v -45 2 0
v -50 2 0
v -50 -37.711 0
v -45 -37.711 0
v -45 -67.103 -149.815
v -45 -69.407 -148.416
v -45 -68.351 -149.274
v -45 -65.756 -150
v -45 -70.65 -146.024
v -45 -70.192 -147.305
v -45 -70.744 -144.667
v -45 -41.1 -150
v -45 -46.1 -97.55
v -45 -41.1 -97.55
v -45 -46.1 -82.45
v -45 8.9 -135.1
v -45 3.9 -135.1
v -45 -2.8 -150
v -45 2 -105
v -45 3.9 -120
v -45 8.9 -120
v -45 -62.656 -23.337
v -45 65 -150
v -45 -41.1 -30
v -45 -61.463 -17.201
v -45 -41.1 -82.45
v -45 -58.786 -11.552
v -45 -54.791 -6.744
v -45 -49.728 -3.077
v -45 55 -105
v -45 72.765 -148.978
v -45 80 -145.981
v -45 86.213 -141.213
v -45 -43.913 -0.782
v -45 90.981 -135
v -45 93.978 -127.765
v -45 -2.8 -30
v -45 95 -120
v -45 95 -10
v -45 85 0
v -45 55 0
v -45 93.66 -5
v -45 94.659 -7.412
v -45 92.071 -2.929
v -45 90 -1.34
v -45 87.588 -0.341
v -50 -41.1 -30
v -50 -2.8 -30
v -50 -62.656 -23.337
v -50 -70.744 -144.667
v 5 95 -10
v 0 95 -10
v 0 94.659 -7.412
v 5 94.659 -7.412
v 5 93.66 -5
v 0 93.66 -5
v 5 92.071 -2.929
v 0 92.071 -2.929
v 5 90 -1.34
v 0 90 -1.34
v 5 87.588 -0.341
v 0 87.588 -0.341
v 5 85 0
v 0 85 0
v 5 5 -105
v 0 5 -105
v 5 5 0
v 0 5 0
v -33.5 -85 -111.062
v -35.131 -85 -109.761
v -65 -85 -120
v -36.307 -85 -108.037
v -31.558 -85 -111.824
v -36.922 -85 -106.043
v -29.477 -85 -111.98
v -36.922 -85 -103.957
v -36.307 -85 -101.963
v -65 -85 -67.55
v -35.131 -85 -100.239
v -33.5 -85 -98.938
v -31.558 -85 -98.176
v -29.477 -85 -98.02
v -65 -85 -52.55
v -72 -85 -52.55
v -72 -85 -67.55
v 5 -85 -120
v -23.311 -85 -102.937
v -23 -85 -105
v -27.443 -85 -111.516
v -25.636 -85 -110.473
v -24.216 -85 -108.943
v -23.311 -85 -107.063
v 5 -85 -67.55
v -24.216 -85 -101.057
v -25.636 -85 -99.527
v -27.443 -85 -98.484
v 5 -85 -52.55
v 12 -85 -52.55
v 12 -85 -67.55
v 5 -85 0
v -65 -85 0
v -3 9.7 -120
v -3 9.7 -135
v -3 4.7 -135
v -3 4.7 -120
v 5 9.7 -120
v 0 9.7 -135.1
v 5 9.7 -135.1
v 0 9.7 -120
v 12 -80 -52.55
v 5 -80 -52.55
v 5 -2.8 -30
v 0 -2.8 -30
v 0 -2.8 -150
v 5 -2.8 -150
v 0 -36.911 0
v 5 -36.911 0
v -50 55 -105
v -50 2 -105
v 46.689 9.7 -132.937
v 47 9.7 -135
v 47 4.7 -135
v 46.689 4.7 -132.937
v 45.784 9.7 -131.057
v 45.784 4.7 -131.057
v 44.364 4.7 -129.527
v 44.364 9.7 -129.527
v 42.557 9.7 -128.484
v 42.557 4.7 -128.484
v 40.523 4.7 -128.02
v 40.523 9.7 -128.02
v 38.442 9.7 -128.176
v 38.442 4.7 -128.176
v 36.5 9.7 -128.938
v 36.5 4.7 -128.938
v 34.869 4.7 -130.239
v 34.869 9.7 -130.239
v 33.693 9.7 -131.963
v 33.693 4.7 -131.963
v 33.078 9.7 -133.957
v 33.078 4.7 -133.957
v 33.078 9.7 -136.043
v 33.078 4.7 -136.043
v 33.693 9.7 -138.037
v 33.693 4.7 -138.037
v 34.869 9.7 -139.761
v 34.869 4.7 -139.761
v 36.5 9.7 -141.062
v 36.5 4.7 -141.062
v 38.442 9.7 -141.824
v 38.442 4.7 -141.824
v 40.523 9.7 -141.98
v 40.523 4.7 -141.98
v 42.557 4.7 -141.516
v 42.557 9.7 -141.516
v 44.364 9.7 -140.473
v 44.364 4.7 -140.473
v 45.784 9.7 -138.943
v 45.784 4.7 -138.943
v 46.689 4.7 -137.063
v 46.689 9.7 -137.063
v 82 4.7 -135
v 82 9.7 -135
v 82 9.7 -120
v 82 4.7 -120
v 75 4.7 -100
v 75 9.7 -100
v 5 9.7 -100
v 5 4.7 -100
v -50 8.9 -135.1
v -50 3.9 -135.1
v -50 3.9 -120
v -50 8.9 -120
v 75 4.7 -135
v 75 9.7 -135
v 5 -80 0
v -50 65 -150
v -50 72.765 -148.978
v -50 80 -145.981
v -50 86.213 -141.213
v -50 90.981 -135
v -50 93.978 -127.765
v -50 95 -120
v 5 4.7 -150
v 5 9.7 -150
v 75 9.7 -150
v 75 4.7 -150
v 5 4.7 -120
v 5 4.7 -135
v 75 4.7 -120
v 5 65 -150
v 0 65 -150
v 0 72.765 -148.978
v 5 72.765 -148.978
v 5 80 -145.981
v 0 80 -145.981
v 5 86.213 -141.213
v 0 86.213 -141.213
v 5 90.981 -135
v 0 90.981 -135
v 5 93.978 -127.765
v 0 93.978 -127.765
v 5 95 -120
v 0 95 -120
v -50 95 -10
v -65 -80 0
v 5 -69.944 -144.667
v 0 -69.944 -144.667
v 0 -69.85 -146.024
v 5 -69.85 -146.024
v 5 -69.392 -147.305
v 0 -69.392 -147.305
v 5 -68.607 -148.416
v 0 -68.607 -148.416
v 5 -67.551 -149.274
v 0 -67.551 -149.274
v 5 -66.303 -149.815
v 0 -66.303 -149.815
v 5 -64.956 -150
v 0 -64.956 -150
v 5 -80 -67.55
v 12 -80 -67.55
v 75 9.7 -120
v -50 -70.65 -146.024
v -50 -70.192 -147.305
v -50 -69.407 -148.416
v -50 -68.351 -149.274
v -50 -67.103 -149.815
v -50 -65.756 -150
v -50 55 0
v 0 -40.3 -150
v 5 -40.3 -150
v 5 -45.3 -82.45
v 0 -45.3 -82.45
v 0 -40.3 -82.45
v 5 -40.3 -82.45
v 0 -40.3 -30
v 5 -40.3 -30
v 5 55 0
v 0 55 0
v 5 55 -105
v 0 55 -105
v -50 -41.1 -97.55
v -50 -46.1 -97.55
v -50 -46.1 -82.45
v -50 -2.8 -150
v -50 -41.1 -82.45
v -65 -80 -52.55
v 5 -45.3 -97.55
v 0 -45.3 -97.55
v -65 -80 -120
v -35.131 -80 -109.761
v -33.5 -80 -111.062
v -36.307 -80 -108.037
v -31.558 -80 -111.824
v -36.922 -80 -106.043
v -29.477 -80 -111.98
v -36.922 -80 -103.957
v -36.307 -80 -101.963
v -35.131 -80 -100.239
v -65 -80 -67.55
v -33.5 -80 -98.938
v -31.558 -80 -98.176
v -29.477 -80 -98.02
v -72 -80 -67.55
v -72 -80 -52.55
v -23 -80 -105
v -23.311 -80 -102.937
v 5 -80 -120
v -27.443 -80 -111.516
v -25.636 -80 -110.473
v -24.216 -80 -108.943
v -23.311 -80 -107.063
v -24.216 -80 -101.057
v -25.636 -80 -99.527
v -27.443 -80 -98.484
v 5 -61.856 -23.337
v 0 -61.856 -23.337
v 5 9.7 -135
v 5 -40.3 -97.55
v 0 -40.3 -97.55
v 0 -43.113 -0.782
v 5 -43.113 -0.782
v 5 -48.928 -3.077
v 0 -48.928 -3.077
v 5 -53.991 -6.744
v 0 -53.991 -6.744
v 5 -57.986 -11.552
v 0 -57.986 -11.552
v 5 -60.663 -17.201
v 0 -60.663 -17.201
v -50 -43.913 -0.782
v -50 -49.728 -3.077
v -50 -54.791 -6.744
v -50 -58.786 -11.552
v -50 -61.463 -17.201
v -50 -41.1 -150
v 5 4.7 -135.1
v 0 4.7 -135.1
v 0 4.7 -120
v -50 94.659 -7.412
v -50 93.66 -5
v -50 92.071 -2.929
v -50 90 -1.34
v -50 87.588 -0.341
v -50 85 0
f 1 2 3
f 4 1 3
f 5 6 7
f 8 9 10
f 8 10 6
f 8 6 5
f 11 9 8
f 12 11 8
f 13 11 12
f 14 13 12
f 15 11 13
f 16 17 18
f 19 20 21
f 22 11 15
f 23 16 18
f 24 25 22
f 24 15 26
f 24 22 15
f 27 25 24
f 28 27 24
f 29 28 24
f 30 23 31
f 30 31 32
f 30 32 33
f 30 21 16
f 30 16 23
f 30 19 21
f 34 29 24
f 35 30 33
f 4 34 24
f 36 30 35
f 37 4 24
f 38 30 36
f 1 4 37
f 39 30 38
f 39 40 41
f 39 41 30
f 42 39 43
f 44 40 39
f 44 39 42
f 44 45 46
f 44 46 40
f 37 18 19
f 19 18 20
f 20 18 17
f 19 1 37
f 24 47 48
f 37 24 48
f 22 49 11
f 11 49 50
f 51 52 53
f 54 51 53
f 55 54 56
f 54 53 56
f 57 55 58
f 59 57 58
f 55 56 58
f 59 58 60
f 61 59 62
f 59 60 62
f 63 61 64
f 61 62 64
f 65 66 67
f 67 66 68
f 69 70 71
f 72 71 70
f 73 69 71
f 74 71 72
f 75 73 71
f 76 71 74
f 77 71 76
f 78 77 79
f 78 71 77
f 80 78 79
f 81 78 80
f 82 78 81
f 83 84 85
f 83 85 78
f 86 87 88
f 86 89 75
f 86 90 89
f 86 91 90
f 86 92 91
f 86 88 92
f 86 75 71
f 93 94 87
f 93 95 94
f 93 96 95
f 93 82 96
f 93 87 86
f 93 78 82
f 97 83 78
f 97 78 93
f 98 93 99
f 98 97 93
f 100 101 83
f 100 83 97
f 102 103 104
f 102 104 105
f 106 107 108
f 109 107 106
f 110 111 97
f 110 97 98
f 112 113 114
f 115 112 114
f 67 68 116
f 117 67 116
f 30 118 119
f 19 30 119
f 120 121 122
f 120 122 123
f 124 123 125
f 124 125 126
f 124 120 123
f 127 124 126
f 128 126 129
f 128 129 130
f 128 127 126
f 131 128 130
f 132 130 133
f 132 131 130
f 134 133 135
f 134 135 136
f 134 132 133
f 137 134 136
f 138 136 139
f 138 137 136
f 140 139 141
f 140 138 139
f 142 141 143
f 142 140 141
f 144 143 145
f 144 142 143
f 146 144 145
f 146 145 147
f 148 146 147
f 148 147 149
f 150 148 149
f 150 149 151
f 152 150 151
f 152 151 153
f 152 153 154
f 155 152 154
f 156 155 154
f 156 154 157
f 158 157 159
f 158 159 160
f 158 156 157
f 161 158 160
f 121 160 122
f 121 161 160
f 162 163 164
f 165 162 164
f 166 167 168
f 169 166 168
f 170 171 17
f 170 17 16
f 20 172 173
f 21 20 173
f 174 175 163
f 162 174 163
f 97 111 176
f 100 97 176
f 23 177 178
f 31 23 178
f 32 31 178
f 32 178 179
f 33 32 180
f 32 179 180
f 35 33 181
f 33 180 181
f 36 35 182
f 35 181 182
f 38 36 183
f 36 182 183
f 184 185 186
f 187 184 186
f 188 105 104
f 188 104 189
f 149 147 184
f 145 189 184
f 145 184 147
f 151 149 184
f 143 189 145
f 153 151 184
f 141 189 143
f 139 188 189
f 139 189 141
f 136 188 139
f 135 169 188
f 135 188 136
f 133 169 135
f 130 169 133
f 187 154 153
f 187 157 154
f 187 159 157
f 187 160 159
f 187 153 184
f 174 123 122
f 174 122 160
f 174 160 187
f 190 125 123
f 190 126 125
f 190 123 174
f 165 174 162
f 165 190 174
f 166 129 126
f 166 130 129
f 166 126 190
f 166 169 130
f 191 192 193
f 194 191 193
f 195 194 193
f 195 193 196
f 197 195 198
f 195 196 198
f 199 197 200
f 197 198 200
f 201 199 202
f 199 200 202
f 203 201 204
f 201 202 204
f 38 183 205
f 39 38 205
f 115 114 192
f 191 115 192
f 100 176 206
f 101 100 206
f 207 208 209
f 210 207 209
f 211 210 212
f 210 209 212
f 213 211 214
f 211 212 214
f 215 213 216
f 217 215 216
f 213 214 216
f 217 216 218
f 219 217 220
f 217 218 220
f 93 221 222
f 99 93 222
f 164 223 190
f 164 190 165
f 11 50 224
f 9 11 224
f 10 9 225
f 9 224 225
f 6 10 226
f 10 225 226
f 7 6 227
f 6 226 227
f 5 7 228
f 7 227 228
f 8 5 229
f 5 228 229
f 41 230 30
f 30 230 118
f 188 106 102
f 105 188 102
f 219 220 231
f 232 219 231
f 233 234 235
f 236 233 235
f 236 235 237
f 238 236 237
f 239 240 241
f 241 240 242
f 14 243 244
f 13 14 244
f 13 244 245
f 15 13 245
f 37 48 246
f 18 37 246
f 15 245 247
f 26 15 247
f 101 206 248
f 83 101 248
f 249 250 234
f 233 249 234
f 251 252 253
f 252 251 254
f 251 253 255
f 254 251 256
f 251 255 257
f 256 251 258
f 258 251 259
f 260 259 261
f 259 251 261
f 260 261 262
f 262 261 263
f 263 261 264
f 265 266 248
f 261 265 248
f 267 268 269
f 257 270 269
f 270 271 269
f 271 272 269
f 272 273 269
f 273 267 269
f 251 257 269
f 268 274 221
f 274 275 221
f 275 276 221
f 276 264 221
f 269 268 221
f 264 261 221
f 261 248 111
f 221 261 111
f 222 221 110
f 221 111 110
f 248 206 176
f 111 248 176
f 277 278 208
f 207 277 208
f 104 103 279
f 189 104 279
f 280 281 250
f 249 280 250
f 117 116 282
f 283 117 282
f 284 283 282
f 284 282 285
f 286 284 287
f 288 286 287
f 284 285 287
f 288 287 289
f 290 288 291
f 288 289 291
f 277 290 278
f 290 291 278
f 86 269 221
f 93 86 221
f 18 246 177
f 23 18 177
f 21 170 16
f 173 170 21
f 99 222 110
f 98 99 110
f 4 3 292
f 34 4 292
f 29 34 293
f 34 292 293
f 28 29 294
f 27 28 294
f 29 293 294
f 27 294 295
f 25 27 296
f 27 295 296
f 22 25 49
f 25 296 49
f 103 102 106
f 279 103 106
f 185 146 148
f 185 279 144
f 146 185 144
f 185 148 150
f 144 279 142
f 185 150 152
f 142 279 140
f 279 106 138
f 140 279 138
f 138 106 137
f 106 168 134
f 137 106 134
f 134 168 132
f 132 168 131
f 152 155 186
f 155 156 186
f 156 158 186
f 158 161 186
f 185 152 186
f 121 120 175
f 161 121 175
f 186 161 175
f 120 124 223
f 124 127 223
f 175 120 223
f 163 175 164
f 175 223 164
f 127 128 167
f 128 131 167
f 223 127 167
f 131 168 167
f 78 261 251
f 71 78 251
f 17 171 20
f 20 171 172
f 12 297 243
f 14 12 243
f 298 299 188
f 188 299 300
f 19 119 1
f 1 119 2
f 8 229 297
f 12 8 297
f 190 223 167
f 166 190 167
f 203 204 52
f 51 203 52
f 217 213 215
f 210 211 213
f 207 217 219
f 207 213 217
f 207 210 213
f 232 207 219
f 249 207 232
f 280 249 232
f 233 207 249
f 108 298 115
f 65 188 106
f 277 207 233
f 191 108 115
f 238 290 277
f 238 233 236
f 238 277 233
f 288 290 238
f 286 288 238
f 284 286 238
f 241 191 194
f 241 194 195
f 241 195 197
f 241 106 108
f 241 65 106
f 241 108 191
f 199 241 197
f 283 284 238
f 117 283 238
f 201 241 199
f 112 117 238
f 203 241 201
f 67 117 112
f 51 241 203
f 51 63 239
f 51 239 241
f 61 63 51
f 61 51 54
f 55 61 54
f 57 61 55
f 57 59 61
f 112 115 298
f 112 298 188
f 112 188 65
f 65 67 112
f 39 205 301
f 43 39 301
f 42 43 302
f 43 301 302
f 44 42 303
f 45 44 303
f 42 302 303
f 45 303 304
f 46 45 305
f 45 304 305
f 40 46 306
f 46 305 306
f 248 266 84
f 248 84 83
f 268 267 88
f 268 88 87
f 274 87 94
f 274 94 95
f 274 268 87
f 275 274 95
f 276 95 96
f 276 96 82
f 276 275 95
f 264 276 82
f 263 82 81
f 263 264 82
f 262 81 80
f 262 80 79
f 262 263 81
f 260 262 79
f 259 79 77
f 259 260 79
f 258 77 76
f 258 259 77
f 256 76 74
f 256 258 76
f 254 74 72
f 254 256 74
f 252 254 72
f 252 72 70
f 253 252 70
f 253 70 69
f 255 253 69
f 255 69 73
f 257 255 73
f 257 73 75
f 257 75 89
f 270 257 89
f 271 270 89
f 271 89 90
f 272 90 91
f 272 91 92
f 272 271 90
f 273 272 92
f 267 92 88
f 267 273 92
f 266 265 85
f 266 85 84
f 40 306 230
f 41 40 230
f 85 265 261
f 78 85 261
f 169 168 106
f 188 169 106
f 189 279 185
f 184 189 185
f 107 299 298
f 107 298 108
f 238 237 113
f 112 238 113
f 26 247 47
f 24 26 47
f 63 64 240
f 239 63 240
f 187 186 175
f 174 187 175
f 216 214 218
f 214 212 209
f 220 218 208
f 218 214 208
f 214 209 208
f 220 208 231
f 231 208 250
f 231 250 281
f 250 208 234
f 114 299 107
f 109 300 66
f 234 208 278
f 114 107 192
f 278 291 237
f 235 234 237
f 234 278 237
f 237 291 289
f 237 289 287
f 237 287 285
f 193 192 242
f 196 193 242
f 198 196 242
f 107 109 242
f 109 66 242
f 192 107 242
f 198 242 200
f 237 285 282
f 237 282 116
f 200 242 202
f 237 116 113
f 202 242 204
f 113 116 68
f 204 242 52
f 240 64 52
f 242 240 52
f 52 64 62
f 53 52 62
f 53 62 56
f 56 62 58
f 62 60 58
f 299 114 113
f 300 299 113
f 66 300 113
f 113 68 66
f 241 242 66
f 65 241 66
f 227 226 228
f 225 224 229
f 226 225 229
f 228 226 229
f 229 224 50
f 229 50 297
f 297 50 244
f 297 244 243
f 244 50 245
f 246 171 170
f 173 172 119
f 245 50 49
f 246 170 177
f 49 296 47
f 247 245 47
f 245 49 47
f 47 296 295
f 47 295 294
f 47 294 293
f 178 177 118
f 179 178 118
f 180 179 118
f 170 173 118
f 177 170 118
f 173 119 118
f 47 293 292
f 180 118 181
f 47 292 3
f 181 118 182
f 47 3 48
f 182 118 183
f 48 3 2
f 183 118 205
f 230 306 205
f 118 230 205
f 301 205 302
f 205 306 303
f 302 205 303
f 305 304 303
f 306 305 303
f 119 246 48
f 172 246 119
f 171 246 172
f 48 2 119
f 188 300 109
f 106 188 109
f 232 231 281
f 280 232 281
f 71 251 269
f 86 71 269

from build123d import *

# Parameters (mm, degrees)
F0_W     = 5
F0_H     = 15.1
F0_W_2   = 0.3
F1_DEPTH = 5
F2_W     = 7
F2_H     = 15
F2_R     = 7
F2_W_2   = 3
F2_W_3   = 5
F3_DEPTH = 5
F5_W     = 5
F5_H     = 15.1
F6_DEPTH = 5
F8_W     = 7
F8_H     = 15
F8_W_2   = 70
F8_H_2   = 50
F8_R     = 7
F9_DEPTH = 5


with BuildPart() as f1:
    # F0 (on Right) → F1 (new body)
    with BuildSketch(Plane.YZ):
        with BuildLine():
            Line((5, -82.45), (5, 0))
            Line((5, 0), (0, 0))
            Line((0, 0), (-36.911173, 0))
            ThreePointArc((-36.911173, 0), (-53.990775, -6.743845), (-61.855802, -23.337025))
            Line((-61.855802, -23.337025), (-69.944494, -144.667405))
            ThreePointArc((-69.944494, -144.667405), (-68.606799, -148.41592), (-64.955568, -150))
            Line((-64.955568, -150), (-40.3, -150))
            Line((-40.3, -150), (-40.3, -97.55))
            Line((-40.3, -97.55), (-45.3, -97.55))
            Line((-45.3, -97.55), (-45.3, -82.45))
            Line((-45.3, -82.45), (-40.3, -82.45))
            Line((-40.3, -82.45), (-40.3, -30))
            Line((-40.3, -30), (-2.8, -30))
            Line((-2.8, -30), (-2.8, -150))
            Line((-2.8, -150), (4.7, -150))
            Line((4.7, -150), (65, -150))
            ThreePointArc((65, -150), (86.213203, -141.213203), (95, -120))
            Line((95, -120), (95, -10))
            ThreePointArc((95, -10), (92.071068, -2.928932), (85, 0))
            Line((85, 0), (55, 0))
            Line((55, 0), (55, -105))
            Line((55, -105), (5, -105))
            Line((5, -105), (5, -97.55))
            Line((5, -97.55), (4.7, -97.55))
            Line((4.7, -97.55), (4.7, -82.45))
            Line((4.7, -82.45), (5, -82.45))
        make_face()
        with Locations((7.2, -127.55)):
            Rectangle(F0_W, F0_H, mode=Mode.SUBTRACT)
        with Locations((4.85, -90)):
            Rectangle(F0_W_2, F0_H)
    extrude(amount=F1_DEPTH)


with BuildPart() as f3:
    # F2 (on face) → F3 (new body)
    with BuildSketch(Plane.XZ.offset(-9.7)):
        with Locations((78.5, -127.5)):
            Rectangle(F2_W, F2_H)
        Polygon((75, -100), (5, -100), (5, -120), (5, -135), (5, -135.1), (5, -150), (75, -150), (75, -135), (75, -120), align=None)
        with Locations((40, -135)):
            Circle(F2_R, mode=Mode.SUBTRACT)
        with Locations((-1.5, -127.5)):
            Rectangle(F2_W_2, F2_H)
        with Locations((2.5, -127.5)):
            Rectangle(F2_W_3, F2_H)
    extrude(amount=F3_DEPTH)


with BuildPart() as f6:
    # F5 (on offset) → F6 (new body)
    with BuildSketch(Plane.YZ.offset(-50)):
        with BuildLine():
            Line((2, -30), (2, 0))
            Line((2, 0), (0, 0))
            Line((0, 0), (-37.711173, 0))
            ThreePointArc((-37.711173, 0), (-54.790775, -6.743845), (-62.655802, -23.337025))
            Line((-62.655802, -23.337025), (-70.744494, -144.667405))
            ThreePointArc((-70.744494, -144.667405), (-69.406799, -148.41592), (-65.755568, -150))
            Line((-65.755568, -150), (-41.1, -150))
            Line((-41.1, -150), (-41.1, -97.55))
            Line((-41.1, -97.55), (-46.1, -97.55))
            Line((-46.1, -97.55), (-46.1, -82.45))
            Line((-46.1, -82.45), (-41.1, -82.45))
            Line((-41.1, -82.45), (-41.1, -30))
            Line((-41.1, -30), (-2.8, -30))
            Line((-2.8, -30), (2, -30))
        make_face()
        with BuildLine():
            Line((2, -105), (2, -30))
            Line((2, -30), (-2.8, -30))
            Line((-2.8, -30), (-2.8, -150))
            Line((-2.8, -150), (3.9, -150))
            Line((3.9, -150), (65, -150))
            ThreePointArc((65, -150), (86.213203, -141.213203), (95, -120))
            Line((95, -120), (95, -10))
            ThreePointArc((95, -10), (92.071068, -2.928932), (85, 0))
            Line((85, 0), (55, 0))
            Line((55, 0), (55, -105))
            Line((55, -105), (5, -105))
            Line((5, -105), (2, -105))
        make_face()
        with Locations((6.4, -127.55)):
            Rectangle(F5_W, F5_H, mode=Mode.SUBTRACT)
    extrude(amount=F6_DEPTH)


with BuildPart() as f9:
    # F8 (on offset) → F9 (new body)
    with BuildSketch(Plane.XZ.offset(80)):
        Polygon((5, 0), (-65, 0), (-65, -52.55), (-65, -67.55), (-65, -70), (5, -70), (5, -67.55), (5, -52.55), align=None)
        with Locations((-68.5, -60.05)):
            Rectangle(F8_W, F8_H)
        with Locations((8.5, -60.05)):
            Rectangle(F8_W, F8_H)
        with Locations((-30, -95)):
            Rectangle(F8_W_2, F8_H_2)
        with Locations((-30, -105)):
            Circle(F8_R, mode=Mode.SUBTRACT)
    extrude(amount=F9_DEPTH)


solid = Compound([f1.part, f3.part, f6.part, f9.part])
